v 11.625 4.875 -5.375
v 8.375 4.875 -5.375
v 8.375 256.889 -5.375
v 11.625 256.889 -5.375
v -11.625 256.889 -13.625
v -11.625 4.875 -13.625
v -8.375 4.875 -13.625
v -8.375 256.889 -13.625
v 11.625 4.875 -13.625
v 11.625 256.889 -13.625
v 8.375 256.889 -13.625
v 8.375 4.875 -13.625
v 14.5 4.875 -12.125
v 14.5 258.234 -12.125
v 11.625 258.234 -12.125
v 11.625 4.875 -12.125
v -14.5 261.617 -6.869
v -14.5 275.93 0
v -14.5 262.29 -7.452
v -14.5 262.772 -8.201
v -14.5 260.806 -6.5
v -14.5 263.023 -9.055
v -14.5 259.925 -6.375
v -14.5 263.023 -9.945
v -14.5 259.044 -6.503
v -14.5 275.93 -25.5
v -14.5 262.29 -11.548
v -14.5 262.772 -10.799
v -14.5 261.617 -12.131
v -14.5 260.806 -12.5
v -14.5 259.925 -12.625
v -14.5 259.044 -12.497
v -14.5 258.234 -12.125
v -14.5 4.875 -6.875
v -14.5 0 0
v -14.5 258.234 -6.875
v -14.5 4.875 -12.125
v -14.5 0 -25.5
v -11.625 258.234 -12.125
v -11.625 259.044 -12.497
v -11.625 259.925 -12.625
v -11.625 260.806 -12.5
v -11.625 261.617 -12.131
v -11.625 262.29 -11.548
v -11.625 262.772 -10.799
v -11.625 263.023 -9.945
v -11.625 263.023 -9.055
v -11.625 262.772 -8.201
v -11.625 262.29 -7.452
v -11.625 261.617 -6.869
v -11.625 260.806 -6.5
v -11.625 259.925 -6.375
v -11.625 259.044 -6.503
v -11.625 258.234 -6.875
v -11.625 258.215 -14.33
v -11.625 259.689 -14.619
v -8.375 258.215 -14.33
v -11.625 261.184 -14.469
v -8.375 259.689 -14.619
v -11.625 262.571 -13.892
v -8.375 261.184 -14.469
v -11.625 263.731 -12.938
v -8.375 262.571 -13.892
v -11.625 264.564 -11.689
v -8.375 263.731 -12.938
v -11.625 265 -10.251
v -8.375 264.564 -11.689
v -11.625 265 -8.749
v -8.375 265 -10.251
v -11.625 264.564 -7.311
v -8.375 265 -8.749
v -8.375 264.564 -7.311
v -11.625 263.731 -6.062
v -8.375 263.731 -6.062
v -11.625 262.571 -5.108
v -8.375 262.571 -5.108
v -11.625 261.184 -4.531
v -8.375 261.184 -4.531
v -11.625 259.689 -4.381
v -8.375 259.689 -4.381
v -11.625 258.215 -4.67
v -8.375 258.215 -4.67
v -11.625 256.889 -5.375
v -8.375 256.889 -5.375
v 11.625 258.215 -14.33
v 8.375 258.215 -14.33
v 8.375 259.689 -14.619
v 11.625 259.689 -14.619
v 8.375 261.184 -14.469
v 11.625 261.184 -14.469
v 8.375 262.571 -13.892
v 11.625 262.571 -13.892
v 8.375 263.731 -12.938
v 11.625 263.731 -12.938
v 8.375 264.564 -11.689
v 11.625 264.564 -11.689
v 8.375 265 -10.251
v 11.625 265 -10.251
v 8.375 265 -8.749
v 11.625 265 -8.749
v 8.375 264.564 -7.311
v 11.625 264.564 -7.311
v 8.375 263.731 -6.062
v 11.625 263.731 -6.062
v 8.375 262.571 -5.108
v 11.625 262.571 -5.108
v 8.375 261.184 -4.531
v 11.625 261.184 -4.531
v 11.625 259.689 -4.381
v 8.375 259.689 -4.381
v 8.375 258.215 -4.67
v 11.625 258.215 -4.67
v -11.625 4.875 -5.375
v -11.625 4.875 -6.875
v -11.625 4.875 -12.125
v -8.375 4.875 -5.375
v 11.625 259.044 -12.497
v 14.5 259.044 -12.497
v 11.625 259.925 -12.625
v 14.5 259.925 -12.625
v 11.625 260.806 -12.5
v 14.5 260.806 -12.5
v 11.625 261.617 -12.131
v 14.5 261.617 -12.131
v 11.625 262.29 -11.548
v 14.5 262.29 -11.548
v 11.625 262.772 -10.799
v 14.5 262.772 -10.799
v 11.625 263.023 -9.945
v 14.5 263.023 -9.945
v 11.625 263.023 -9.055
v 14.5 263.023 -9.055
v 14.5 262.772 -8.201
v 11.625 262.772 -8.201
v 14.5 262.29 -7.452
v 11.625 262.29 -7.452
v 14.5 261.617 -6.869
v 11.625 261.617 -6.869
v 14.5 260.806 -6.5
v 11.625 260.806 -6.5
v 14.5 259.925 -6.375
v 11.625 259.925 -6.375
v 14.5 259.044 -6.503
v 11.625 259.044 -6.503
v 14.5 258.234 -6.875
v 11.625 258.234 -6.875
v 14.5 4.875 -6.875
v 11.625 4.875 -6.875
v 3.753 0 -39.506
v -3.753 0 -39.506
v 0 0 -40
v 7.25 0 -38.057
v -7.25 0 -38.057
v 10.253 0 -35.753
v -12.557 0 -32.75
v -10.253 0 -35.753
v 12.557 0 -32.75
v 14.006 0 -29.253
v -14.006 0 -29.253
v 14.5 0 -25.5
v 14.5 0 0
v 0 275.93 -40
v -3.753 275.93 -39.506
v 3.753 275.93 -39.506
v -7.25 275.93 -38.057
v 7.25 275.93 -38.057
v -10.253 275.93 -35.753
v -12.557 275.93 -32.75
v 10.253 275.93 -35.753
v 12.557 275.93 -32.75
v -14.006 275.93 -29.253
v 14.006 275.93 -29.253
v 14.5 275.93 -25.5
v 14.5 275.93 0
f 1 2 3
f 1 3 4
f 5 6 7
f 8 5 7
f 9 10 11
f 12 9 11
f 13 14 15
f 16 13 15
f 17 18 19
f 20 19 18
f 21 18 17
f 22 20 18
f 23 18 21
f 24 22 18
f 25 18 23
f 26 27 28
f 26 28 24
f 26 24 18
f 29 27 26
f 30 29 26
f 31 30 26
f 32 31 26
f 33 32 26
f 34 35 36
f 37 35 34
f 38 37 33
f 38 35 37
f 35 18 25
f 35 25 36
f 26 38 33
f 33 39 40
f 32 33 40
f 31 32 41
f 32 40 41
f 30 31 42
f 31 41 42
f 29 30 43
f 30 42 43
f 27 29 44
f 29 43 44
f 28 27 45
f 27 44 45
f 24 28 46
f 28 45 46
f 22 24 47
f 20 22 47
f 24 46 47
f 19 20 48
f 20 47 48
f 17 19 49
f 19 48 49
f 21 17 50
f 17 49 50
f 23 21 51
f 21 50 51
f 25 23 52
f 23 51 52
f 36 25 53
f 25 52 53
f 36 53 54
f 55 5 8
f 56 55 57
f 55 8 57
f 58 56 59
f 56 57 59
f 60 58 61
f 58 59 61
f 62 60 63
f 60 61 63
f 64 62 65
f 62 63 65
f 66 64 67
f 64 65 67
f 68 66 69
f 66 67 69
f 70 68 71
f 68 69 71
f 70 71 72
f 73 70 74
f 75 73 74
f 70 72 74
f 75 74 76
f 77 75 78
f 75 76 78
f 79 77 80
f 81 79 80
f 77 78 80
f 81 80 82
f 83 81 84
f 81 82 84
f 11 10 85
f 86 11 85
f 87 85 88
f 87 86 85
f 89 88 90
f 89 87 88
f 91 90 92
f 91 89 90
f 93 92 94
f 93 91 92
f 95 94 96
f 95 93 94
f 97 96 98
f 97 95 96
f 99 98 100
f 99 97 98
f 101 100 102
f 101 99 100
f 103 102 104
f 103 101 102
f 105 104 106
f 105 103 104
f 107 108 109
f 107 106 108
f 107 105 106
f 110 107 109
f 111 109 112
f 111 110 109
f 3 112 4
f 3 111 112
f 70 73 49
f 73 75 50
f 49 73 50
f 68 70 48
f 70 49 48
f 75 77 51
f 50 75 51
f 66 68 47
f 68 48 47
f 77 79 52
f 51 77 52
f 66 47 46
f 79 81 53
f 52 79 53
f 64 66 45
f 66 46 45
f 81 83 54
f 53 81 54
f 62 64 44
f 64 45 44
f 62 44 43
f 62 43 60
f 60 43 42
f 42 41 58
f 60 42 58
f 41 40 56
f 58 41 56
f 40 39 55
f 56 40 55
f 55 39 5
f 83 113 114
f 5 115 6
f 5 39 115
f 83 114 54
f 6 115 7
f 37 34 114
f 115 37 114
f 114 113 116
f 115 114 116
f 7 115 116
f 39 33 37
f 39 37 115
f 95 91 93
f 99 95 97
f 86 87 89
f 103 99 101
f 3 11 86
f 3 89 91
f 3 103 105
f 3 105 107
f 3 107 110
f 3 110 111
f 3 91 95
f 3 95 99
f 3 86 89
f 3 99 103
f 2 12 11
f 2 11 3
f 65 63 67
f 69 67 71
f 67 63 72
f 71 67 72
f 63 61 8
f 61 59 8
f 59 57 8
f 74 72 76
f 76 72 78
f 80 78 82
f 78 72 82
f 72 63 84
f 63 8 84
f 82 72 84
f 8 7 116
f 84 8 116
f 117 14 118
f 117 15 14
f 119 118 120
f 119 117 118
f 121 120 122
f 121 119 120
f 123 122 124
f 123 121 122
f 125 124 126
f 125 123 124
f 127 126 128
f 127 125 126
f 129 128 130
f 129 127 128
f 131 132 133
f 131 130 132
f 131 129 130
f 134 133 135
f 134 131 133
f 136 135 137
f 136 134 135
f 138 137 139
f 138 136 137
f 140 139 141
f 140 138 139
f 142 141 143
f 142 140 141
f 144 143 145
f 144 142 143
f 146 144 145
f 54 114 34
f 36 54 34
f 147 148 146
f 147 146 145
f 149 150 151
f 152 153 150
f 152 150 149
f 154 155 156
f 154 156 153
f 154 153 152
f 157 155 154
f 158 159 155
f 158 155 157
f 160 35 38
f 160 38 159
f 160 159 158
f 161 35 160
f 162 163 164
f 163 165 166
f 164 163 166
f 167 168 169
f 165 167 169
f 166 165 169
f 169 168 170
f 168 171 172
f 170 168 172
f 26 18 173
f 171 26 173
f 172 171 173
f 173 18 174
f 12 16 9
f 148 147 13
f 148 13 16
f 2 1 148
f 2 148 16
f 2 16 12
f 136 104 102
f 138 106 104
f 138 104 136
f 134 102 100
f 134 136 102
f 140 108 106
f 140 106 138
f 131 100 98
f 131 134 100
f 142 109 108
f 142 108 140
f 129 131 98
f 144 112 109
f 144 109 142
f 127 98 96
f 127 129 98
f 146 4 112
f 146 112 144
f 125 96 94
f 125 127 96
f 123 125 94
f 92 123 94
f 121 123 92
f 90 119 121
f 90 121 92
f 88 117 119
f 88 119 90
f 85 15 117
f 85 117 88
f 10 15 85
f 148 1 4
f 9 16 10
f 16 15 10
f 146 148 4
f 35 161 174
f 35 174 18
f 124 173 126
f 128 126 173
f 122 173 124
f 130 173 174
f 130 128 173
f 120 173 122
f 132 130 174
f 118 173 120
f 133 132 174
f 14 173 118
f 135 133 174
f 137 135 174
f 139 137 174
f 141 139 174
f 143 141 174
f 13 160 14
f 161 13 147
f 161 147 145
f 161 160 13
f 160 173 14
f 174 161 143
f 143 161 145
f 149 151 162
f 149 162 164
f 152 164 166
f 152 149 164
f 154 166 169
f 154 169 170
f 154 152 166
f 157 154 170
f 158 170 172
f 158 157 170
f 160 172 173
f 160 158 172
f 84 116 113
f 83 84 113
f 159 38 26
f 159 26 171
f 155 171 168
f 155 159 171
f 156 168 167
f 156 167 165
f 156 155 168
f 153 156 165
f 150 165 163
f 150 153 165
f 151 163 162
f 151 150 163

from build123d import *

# Parameters (mm, degrees)
F1_DEPTH  = 275.93
F3_DEPTH  = 255.93
F9_OFFSET = 0.125


with BuildPart() as f1:
    # F0 (on Front) → F1 (new body)
    with BuildSketch(Plane.XZ):
        with BuildLine():
            Line((-14.5, 0), (-14.5, -25.5))
            ThreePointArc((-14.5, -25.5), (-10.2530483272, -35.7530483272), (0, -40))
            ThreePointArc((0, -40), (10.2530483272, -35.7530483272), (14.5, -25.5))
            Line((14.5, -25.5), (14.5, 0))
            Line((14.5, 0), (-14.5, 0))
        make_face()
    extrude(amount=-F1_DEPTH)


with BuildPart() as f3:
    # F2 (on Front) → F3 (new body)
    with BuildSketch(Plane.XZ):
        Polygon((0, -4.5), (0, 3.5), (-3, 3.5), (-3, 2), (-8, 2), (-8, -3), (-3, -3), (-3, -4.5), align=None)
    extrude(amount=-F3_DEPTH)


with BuildPart() as f3_1:
    # F4: moved
    add(f3.part.moved(Location((-8.5, 5, -9))))


with BuildPart() as f6:
    # F5 (on Front) → F6 (revolve)
    with BuildSketch(Plane.XZ):
        Polygon((3, 5), (0, 5), (0, 0), (3, 0), (8, 0), (8, 3), (3, 3), align=None)
    revolve(axis=Axis((1.5, 0, 0), (1, 0, 0)))


with BuildPart() as f6_1:
    # F7: moved
    add(f6.part.moved(Location((8.5, 259.93, -9.5))))


with BuildPart() as f8_1:
    # F8: instance of F3
    add(f3_1.part.mirror(Plane.YZ))


with BuildPart() as f8_2:
    # F8: instance of F6
    add(f6_1.part.mirror(Plane.YZ))


with BuildPart() as f1_1:
    add(f1.part)

    # F9: cut F8_1, F3, F6, F8_2, each made larger all round first
    f9_tool = offset(f8_1.part, amount=F9_OFFSET, kind=Kind.INTERSECTION, mode=Mode.PRIVATE)
    add(f9_tool, mode=Mode.SUBTRACT)
    f9_tool1 = offset(f3_1.part, amount=F9_OFFSET, kind=Kind.INTERSECTION, mode=Mode.PRIVATE)
    add(f9_tool1, mode=Mode.SUBTRACT)
    f9_tool2 = offset(f6_1.part, amount=F9_OFFSET, kind=Kind.INTERSECTION, mode=Mode.PRIVATE)
    add(f9_tool2, mode=Mode.SUBTRACT)
    f9_tool3 = offset(f8_2.part, amount=F9_OFFSET, kind=Kind.INTERSECTION, mode=Mode.PRIVATE)
    add(f9_tool3, mode=Mode.SUBTRACT)


solid = f1_1.part
